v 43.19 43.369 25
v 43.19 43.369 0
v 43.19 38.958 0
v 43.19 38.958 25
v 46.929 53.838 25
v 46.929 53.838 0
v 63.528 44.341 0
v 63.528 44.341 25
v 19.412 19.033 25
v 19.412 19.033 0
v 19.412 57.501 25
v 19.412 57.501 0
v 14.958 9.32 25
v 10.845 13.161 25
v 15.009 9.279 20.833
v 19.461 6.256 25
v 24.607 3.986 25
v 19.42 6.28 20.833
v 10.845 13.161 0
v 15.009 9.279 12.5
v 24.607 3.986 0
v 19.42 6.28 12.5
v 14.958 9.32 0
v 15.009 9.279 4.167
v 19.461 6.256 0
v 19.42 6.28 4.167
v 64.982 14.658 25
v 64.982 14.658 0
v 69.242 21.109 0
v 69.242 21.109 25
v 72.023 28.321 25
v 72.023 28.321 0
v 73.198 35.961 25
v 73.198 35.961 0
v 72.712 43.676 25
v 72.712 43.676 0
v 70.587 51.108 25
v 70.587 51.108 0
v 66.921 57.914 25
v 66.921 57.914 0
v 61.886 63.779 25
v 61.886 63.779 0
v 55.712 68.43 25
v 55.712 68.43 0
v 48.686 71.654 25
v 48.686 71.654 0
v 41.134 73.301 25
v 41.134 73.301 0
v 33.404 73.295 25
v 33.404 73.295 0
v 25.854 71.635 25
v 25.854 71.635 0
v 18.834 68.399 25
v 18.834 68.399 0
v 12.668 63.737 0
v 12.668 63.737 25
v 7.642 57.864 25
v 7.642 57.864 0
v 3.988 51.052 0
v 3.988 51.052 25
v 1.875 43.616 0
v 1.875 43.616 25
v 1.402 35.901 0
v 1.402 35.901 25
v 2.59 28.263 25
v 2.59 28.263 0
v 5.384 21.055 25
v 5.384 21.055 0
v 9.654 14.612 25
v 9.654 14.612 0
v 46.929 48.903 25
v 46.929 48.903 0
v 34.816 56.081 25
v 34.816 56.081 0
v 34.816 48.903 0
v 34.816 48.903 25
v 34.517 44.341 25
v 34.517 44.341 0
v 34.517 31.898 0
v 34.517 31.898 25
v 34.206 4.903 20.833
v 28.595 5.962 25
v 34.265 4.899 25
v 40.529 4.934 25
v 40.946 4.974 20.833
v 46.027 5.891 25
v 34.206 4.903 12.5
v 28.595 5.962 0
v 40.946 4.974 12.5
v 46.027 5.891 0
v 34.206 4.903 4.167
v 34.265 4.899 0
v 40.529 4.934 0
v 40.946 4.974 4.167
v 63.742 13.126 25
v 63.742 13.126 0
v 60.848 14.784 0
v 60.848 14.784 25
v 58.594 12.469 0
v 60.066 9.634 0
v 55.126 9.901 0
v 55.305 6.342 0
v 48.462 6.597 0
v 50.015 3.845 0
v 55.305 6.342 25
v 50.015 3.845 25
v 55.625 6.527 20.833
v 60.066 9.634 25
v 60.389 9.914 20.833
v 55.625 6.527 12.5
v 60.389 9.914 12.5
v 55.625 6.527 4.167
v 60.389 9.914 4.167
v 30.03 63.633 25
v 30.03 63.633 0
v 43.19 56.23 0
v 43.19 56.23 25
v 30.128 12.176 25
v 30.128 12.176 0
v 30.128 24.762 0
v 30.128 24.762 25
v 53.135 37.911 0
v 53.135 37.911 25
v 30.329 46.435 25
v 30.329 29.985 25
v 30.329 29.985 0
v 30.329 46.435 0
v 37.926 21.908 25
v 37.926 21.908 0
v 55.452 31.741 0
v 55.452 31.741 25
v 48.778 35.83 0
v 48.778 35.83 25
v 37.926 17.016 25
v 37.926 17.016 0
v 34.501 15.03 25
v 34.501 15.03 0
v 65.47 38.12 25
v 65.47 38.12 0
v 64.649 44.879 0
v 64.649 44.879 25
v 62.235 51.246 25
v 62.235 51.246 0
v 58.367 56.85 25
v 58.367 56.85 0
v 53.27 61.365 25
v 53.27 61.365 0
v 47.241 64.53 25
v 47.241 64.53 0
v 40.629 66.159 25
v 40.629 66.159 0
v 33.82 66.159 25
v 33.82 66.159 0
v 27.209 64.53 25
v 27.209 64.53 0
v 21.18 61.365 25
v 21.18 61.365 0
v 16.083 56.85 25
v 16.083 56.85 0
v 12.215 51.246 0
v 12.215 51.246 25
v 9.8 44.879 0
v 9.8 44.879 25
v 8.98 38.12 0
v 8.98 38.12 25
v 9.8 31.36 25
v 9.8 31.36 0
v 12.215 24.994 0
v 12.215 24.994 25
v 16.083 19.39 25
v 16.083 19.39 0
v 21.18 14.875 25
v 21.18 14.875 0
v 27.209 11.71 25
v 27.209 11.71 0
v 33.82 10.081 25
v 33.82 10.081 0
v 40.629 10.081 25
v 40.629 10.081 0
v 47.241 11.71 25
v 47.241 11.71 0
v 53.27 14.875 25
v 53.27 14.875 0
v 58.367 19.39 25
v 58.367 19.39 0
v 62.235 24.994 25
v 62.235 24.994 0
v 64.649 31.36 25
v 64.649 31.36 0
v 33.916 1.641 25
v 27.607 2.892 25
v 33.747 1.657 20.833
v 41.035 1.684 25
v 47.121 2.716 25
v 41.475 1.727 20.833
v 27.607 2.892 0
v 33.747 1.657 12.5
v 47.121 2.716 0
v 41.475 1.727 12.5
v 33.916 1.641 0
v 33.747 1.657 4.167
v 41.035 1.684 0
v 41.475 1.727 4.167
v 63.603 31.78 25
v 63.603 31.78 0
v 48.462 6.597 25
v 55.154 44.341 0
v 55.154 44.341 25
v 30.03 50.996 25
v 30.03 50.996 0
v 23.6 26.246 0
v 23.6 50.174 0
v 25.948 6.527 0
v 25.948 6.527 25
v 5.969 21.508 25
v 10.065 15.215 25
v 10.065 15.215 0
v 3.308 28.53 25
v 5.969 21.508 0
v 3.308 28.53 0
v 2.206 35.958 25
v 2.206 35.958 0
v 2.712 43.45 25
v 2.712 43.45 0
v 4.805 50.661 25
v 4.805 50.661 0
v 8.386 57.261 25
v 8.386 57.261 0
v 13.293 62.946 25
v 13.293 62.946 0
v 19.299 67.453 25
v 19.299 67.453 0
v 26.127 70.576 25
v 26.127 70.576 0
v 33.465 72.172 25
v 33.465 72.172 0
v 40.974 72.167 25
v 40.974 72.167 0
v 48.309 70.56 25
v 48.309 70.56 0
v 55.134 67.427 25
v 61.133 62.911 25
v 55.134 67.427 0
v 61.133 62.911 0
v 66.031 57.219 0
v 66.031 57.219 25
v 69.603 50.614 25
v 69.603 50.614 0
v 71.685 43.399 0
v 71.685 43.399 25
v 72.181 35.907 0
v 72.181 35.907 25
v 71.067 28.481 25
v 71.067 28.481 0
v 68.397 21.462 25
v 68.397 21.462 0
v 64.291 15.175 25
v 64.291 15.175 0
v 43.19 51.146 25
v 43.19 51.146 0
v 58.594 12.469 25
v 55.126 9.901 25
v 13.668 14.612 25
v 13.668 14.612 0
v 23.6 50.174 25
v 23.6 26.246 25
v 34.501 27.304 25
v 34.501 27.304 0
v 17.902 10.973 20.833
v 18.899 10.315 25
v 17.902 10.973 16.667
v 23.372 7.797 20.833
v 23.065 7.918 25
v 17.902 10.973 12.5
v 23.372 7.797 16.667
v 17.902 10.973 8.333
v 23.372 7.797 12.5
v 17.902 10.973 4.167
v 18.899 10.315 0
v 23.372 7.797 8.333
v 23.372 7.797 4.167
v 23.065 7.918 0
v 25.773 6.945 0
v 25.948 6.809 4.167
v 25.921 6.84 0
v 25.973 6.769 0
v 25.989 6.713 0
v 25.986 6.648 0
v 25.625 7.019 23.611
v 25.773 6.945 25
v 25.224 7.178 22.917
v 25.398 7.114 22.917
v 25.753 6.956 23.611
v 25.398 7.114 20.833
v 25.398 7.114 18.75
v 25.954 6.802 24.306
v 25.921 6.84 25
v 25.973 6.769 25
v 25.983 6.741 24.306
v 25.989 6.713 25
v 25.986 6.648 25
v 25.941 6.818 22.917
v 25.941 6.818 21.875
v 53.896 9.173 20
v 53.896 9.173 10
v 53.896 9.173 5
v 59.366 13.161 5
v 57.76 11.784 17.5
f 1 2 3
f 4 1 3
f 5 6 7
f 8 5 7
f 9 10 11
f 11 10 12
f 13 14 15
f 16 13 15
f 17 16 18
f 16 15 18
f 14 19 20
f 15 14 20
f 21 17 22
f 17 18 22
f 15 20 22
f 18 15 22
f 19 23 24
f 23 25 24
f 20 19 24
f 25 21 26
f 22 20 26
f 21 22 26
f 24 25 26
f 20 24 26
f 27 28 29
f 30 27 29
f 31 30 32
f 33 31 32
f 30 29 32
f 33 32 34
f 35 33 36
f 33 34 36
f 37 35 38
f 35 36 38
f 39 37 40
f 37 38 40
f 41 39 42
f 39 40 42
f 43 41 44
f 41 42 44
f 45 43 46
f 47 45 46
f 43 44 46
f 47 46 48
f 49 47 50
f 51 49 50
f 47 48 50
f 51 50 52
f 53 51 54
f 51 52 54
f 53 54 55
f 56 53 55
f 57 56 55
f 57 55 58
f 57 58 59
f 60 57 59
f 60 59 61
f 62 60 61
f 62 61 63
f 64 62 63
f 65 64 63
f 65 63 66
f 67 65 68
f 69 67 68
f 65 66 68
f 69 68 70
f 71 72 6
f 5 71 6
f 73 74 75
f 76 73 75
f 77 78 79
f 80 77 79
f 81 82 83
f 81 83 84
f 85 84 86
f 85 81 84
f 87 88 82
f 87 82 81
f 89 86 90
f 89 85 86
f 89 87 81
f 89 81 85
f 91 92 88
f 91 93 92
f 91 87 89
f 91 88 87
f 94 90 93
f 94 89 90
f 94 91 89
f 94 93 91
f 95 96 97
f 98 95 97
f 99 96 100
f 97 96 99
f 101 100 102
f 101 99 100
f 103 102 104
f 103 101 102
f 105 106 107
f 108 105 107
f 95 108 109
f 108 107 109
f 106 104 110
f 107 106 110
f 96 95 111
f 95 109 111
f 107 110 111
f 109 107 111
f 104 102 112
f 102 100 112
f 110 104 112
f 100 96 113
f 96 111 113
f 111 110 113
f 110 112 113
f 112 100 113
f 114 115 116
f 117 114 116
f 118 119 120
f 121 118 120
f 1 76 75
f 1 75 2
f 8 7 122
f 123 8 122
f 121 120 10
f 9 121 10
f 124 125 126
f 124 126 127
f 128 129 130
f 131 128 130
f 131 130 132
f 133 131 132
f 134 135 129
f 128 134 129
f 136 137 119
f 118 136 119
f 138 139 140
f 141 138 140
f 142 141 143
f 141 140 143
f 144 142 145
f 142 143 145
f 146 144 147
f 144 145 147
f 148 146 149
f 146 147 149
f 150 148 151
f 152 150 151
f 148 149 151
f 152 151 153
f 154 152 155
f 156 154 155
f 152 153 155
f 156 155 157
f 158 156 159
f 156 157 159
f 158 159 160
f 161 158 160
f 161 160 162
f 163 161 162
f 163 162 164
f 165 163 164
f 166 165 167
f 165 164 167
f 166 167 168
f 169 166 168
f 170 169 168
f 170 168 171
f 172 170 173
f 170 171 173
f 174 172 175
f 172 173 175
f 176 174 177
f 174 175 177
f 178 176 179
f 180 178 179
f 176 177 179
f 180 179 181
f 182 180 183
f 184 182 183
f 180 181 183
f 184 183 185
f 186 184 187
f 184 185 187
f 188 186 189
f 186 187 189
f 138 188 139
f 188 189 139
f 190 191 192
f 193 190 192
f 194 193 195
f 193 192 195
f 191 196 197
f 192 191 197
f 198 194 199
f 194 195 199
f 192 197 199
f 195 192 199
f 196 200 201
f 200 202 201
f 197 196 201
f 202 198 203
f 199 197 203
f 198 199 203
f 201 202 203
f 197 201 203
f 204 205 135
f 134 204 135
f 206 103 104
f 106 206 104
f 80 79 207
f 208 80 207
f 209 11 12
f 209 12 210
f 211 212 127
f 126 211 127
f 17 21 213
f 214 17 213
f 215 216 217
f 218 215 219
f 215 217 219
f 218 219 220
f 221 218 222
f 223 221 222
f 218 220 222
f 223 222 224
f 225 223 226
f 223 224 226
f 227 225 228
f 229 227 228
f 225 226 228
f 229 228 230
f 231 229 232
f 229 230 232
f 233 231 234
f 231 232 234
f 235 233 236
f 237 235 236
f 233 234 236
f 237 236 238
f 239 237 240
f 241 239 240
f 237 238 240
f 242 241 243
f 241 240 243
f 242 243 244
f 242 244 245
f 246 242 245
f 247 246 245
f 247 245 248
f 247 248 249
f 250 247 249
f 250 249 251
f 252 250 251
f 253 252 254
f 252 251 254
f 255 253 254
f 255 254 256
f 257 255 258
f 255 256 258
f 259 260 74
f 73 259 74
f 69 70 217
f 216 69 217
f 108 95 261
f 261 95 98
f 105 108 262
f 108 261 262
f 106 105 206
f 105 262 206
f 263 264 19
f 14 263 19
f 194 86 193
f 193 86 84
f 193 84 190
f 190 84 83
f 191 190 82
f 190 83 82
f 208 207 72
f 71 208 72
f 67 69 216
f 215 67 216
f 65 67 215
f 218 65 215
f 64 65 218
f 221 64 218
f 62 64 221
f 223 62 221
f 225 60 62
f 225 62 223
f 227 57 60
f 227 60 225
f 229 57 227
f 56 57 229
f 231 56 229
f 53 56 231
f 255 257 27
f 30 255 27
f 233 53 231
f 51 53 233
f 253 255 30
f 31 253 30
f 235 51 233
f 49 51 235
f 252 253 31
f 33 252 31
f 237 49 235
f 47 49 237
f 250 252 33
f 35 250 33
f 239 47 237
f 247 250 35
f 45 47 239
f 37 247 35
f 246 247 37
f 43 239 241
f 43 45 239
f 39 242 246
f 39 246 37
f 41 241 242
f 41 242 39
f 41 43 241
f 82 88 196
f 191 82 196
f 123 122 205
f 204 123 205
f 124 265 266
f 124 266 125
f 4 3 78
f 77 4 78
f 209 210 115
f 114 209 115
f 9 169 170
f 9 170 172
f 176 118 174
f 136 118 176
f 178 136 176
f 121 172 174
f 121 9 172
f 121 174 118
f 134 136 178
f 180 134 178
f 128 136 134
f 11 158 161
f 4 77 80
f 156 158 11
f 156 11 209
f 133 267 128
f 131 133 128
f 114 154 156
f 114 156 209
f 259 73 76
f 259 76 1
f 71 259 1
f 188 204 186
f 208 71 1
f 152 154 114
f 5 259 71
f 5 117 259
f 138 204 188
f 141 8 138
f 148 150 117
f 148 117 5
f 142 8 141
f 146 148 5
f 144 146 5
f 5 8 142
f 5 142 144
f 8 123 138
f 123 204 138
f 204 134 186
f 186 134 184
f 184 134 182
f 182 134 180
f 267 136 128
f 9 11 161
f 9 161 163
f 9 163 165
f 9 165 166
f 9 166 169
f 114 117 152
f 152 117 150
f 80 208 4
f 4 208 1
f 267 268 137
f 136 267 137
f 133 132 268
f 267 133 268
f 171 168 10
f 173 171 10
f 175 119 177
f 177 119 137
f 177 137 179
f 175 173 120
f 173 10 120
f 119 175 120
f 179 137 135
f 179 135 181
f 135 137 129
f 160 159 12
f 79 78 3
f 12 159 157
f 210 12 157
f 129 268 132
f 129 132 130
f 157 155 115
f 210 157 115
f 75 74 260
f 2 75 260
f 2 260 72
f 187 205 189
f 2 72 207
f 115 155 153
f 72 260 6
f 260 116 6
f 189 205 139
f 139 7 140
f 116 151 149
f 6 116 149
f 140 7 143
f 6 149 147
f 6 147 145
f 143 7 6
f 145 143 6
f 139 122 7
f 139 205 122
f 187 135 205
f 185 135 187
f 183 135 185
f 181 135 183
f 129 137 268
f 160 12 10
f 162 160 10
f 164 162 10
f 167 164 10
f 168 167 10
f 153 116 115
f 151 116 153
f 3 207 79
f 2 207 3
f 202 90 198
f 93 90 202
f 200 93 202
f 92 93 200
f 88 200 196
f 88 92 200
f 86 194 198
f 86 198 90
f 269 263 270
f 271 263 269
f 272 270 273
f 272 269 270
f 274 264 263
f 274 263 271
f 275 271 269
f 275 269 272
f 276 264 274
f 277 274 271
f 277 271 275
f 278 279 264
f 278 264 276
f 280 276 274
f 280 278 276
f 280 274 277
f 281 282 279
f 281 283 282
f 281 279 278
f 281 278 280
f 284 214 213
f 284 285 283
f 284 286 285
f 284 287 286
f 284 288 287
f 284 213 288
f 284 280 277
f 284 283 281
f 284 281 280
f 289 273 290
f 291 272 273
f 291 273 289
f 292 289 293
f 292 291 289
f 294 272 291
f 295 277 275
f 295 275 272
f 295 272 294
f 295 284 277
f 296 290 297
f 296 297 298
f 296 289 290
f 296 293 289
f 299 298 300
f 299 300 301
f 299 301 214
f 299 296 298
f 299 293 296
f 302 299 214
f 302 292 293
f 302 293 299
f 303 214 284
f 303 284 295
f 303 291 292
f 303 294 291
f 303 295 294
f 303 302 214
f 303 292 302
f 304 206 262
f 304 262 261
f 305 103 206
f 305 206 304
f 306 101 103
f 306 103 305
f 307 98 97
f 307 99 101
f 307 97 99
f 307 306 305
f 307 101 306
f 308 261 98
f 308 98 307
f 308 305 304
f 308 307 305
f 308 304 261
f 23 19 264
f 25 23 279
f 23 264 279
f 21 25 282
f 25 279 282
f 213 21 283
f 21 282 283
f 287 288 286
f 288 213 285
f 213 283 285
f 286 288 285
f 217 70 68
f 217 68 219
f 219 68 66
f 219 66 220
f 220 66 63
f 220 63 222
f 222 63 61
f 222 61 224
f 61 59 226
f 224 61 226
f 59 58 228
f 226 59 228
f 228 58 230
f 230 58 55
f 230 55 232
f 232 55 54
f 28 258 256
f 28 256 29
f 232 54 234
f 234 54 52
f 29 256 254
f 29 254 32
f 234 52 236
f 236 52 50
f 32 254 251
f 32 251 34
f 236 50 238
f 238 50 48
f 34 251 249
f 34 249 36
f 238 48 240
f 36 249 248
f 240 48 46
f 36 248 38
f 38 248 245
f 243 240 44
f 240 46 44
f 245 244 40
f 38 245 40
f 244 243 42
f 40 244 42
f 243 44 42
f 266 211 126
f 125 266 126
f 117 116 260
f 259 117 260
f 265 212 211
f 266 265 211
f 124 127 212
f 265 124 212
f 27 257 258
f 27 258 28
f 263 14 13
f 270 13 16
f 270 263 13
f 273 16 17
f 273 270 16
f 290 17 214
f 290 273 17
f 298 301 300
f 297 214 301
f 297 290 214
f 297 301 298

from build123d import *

# Parameters (mm, degrees)
F1_DEPTH = 25
F0_R     = 28.2451960737


with BuildPart() as f1:
    # F0 (on Top) → F1 (new body)
    with BuildSketch(Plane.XY):
        with BuildLine():
            ThreePointArc((10.0652156398, 15.2148902416), (37.2197382999, 72.371182903), (64.2907321453, 15.1752810925))
            Line((64.2907321453, 15.1752810925), (64.9820417166, 14.65836633))
            ThreePointArc((64.9820417166, 14.65836633), (37.2684516734, 73.5063348544), (9.6539957449, 14.6117825061))
            Line((9.6539957449, 14.6117825061), (10.0652156398, 15.2148902416))
        make_face()
    extrude(amount=F1_DEPTH)


with BuildPart() as f1b:
    # F0 (on Top) → F1, piece 2 (new body)
    with BuildSketch(Plane.XY):
        with BuildLine():
            Line((13.6678591371, 14.6117825061), (10.8448099345, 13.1608117372))
            add(Edge.make_bspline(
                [(10.8448099345, 13.1608117372), (11.4124021823, 12.5396567352), (12.6007121946, 11.2392078465), (15.0032267377, 9.2579629819), (17.1451019651, 7.6340912256), (19.428292046, 6.2573238199), (21.6271182234, 5.0363501979), (23.5758351515, 4.3494411924), (24.6071796864, 3.9858995005)],
                knots=[0, 0, 0, 0, 0.1610155293, 0.3371017951, 0.5020622334, 0.6636696995, 0.8219995874, 1, 1, 1, 1], degree=3))
            Line((24.6071796864, 3.9858995005), (25.9481277317, 6.5266448073))
            add(Edge.make_bspline(
                [(13.6678591371, 14.6117825061), (14.3884881574, 13.9149575941), (15.7909577994, 12.5588148949), (17.8685251625, 10.9291328523), (20.5132963021, 9.319112071), (23.0099204009, 7.7247989441), (26.1344995918, 7.0087116568), (25.9844843934, 6.6206844405), (25.9481277317, 6.5266448073)],
                knots=[0, 0, 0, 0, 0.1888843352, 0.3676018292, 0.5585910855, 0.7588569617, 0.9415582157, 1, 1, 1, 1], degree=3))
        make_face()
    extrude(amount=F1_DEPTH)


with BuildPart() as f1c:
    # F0 (on Top) → F1, piece 3 (new body)
    with BuildSketch(Plane.XY):
        with BuildLine():
            add(Edge.make_bspline(
                [(28.5947360098, 5.9620342217), (29.4912759142, 5.7383407517), (31.305630172, 5.2856456762), (34.2319380603, 4.8214984829), (37.2839752571, 4.8322950748), (40.9171585122, 4.8487140913), (43.9625783196, 5.503737358), (45.3885417751, 5.7715394441), (46.027071774, 5.8914581314)],
                knots=[0, 0, 0, 0, 0.1630405109, 0.3299498927, 0.5009869385, 0.6880337751, 0.8603051204, 1, 1, 1, 1], degree=3))
            Line((28.5947360098, 5.9620342217), (27.6066698134, 2.8919673059))
            add(Edge.make_bspline(
                [(27.6066698134, 2.8919673059), (28.3812128193, 2.6584458031), (30.0886550938, 2.1436590411), (33.8166758875, 1.5757971002), (37.3314106305, 1.4665884812), (41.4667517013, 1.6484738587), (44.397712474, 2.1672162978), (46.2273883056, 2.5356053666), (47.1210032701, 2.7155268472)],
                knots=[0, 0, 0, 0, 0.147535907, 0.3252357101, 0.5011142734, 0.6878164675, 0.8475293429, 1, 1, 1, 1], degree=3))
            Line((47.1210032701, 2.7155268472), (46.027071774, 5.8914581314))
        make_face()
    extrude(amount=F1_DEPTH)


with BuildPart() as f1d:
    # F0 (on Top) → F1, piece 4 (new body)
    with BuildSketch(Plane.XY):
        with BuildLine():
            add(Edge.make_bspline(
                [(48.4619513154, 6.5972208977), (49.2744350434, 6.9403561406), (50.977210422, 7.6594871498), (53.9734735437, 9.1603234858), (56.3816162988, 10.6712369931), (59.4208437884, 13.0722754418), (60.4178294868, 14.2680317543), (60.8480833471, 14.7840660065)],
                knots=[0, 0, 0, 0, 0.1917479065, 0.40185865, 0.6015916235, 0.8280649941, 1, 1, 1, 1], degree=3))
            Line((48.4619513154, 6.5972208977), (50.0146299601, 3.844747087))
            add(Edge.make_bspline(
                [(50.0146299601, 3.844747087), (50.8392764991, 4.1308659032), (52.5800805539, 4.7558414675), (55.6238472648, 6.5356087292), (58.4369553504, 8.1258007197), (60.3524697779, 9.9369726466), (62.0640048338, 11.2372649905), (63.1675190527, 12.4783636747), (63.7417137623, 13.1255239248)],
                knots=[0, 0, 0, 0, 0.1643419041, 0.3526823507, 0.5340577326, 0.6949039832, 0.8409904654, 1, 1, 1, 1], degree=3))
            Line((63.7417137623, 13.1255239248), (60.8480833471, 14.7840660065))
        make_face()
    extrude(amount=F1_DEPTH)


with BuildPart() as f1e:
    # F0 (on Top) → F1, piece 5 (new body)
    with BuildSketch(Plane.XY):
        Polygon((30.3292386234, 46.4350841939), (23.5996749252, 50.1737296581), (23.5996749252, 26.2463930994), (30.3292386234, 29.9850385636), align=None)
    extrude(amount=F1_DEPTH)


with BuildPart() as f1f:
    # F0 (on Top) → F1, piece 6 (new body)
    with BuildSketch(Plane.XY):
        with Locations((37.2247286141, 38.1199643016)):
            Circle(F0_R)
        Polygon((63.528418541, 44.3414412439), (53.1349815428, 37.9109680653), (63.6031925678, 31.7795909941), (37.9261896014, 17.0164387673), (37.9261896014, 21.9077505171), (55.4517167102, 31.7408069698), (48.7780049443, 35.8296297491), (34.5012918115, 27.3036640137), (34.5012918115, 15.0304567069), (30.1276370883, 12.1763702482), (30.1276370883, 24.7620418668), (19.4123908877, 19.0333016217), (19.4123908877, 57.501476258), (30.0301462412, 50.9962327778), (30.0301462412, 63.6328607798), (43.1901812553, 56.230340153), (43.1901812553, 51.1457808316), (34.8156131804, 56.0807920992), (34.8156131804, 48.9025898278), (43.1901812553, 43.3693937957), (43.1901812553, 38.9577895403), (34.5165207982, 44.3414412439), (34.5165207982, 31.8984873593), (55.1538541913, 44.3414412439), (46.9288304448, 48.9025898278), (46.9288304448, 53.8376048207), align=None, mode=Mode.SUBTRACT)
    extrude(amount=F1_DEPTH)


solid = Compound([f1.part, f1b.part, f1c.part, f1d.part, f1e.part, f1f.part])
